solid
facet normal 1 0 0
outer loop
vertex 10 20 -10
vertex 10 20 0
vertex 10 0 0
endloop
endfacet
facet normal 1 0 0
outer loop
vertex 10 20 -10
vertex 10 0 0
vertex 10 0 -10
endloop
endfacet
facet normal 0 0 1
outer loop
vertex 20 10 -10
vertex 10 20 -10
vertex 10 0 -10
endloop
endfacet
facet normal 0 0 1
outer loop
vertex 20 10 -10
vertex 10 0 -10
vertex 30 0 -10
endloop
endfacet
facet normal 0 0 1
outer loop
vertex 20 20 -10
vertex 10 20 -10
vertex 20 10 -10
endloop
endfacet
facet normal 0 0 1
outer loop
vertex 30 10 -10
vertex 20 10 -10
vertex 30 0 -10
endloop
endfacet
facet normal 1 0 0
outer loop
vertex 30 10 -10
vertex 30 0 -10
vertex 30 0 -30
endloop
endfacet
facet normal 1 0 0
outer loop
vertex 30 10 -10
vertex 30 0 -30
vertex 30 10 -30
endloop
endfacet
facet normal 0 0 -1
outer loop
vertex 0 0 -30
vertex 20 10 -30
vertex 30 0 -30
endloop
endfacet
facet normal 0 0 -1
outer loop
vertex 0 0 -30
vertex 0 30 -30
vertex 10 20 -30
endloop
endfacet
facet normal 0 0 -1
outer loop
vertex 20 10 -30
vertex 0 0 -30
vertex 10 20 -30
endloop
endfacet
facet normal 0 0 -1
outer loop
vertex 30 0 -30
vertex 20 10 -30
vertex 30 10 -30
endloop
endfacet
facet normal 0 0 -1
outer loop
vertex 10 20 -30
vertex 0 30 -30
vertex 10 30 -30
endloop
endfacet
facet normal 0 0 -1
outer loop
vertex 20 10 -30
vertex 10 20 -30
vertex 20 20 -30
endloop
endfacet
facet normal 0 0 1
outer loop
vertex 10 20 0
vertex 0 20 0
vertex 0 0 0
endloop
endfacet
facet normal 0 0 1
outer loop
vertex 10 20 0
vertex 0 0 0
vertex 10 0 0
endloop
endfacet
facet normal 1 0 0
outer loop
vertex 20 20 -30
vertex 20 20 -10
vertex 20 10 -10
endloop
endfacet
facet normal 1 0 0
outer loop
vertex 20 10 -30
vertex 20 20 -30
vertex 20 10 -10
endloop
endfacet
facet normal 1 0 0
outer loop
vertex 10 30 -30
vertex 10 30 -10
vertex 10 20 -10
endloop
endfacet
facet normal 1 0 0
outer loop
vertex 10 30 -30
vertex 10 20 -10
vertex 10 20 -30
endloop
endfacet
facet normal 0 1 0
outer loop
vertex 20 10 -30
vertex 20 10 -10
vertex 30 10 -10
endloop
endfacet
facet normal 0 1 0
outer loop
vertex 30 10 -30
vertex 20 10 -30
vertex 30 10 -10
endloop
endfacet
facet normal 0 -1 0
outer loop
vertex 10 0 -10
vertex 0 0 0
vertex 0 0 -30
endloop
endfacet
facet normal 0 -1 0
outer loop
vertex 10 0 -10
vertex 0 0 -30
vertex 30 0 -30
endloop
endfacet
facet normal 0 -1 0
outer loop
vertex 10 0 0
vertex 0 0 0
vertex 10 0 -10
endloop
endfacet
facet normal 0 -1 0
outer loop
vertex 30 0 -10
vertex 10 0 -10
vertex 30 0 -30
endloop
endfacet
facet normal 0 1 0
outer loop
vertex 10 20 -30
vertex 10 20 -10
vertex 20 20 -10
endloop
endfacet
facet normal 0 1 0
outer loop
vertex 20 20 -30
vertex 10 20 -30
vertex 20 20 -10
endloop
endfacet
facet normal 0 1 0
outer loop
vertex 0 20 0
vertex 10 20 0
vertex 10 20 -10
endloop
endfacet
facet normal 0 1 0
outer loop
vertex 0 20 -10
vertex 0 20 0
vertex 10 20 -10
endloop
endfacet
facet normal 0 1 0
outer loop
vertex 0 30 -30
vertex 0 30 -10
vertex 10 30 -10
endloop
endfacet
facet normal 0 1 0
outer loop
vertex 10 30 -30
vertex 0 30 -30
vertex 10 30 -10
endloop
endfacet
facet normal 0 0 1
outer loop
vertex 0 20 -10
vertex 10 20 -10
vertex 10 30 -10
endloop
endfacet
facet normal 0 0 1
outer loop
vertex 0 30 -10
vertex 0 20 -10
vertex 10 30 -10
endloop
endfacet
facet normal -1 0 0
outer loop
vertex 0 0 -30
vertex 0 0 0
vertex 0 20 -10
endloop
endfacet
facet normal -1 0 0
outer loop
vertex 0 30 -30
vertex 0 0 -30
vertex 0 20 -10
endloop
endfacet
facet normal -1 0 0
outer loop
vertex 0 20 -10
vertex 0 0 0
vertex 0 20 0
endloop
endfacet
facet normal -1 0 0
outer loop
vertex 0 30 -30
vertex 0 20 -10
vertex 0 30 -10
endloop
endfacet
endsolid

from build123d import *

# Parameters (mm, degrees)
SKETCH_1_W          = 30
SKETCH_1_H          = 30
EXTRUDE_1_DEPTH     = 30
CUT_EXTRUDE_1_DEPTH = 52.961524227
SKETCH_3_W          = 20
SKETCH_3_H          = 10
CUT_EXTRUDE_2_DEPTH = 52.961524227
SKETCH_4_W          = 10
SKETCH_4_H          = 10
CUT_EXTRUDE_3_DEPTH = 52.961524227


with BuildPart() as part:
    # 草圖1 → 填料-伸長1 (new body)
    with BuildSketch(Plane.XY):
        with Locations((15, 15)):
            Rectangle(SKETCH_1_W, SKETCH_1_H)
    extrude(amount=-EXTRUDE_1_DEPTH)

    # 草圖2 → 除料-伸長1 (cut, through all)
    with BuildSketch(Plane.XY):
        Polygon((30, 30), (10, 30), (10, 20), (20, 20), (20, 10), (30, 10), align=None)
    extrude(amount=-CUT_EXTRUDE_1_DEPTH, mode=Mode.SUBTRACT)

    # 草圖3 → 除料-伸長2 (cut, through all)
    with BuildSketch(Plane(origin=(0, 30, 0), x_dir=(1, 0, 0), z_dir=(0, 1, 0))):
        with Locations((20, 5)):
            Rectangle(SKETCH_3_W, SKETCH_3_H)
    extrude(amount=-CUT_EXTRUDE_2_DEPTH, mode=Mode.SUBTRACT)

    # 草圖4 → 除料-伸長3 (cut, through all)
    with BuildSketch(Plane(origin=(30, 0, 0), x_dir=(0, 0, -1), z_dir=(1, 0, 0))):
        with Locations((5, 25)):
            Rectangle(SKETCH_4_W, SKETCH_4_H)
    extrude(amount=-CUT_EXTRUDE_3_DEPTH, mode=Mode.SUBTRACT)


solid = part.part
